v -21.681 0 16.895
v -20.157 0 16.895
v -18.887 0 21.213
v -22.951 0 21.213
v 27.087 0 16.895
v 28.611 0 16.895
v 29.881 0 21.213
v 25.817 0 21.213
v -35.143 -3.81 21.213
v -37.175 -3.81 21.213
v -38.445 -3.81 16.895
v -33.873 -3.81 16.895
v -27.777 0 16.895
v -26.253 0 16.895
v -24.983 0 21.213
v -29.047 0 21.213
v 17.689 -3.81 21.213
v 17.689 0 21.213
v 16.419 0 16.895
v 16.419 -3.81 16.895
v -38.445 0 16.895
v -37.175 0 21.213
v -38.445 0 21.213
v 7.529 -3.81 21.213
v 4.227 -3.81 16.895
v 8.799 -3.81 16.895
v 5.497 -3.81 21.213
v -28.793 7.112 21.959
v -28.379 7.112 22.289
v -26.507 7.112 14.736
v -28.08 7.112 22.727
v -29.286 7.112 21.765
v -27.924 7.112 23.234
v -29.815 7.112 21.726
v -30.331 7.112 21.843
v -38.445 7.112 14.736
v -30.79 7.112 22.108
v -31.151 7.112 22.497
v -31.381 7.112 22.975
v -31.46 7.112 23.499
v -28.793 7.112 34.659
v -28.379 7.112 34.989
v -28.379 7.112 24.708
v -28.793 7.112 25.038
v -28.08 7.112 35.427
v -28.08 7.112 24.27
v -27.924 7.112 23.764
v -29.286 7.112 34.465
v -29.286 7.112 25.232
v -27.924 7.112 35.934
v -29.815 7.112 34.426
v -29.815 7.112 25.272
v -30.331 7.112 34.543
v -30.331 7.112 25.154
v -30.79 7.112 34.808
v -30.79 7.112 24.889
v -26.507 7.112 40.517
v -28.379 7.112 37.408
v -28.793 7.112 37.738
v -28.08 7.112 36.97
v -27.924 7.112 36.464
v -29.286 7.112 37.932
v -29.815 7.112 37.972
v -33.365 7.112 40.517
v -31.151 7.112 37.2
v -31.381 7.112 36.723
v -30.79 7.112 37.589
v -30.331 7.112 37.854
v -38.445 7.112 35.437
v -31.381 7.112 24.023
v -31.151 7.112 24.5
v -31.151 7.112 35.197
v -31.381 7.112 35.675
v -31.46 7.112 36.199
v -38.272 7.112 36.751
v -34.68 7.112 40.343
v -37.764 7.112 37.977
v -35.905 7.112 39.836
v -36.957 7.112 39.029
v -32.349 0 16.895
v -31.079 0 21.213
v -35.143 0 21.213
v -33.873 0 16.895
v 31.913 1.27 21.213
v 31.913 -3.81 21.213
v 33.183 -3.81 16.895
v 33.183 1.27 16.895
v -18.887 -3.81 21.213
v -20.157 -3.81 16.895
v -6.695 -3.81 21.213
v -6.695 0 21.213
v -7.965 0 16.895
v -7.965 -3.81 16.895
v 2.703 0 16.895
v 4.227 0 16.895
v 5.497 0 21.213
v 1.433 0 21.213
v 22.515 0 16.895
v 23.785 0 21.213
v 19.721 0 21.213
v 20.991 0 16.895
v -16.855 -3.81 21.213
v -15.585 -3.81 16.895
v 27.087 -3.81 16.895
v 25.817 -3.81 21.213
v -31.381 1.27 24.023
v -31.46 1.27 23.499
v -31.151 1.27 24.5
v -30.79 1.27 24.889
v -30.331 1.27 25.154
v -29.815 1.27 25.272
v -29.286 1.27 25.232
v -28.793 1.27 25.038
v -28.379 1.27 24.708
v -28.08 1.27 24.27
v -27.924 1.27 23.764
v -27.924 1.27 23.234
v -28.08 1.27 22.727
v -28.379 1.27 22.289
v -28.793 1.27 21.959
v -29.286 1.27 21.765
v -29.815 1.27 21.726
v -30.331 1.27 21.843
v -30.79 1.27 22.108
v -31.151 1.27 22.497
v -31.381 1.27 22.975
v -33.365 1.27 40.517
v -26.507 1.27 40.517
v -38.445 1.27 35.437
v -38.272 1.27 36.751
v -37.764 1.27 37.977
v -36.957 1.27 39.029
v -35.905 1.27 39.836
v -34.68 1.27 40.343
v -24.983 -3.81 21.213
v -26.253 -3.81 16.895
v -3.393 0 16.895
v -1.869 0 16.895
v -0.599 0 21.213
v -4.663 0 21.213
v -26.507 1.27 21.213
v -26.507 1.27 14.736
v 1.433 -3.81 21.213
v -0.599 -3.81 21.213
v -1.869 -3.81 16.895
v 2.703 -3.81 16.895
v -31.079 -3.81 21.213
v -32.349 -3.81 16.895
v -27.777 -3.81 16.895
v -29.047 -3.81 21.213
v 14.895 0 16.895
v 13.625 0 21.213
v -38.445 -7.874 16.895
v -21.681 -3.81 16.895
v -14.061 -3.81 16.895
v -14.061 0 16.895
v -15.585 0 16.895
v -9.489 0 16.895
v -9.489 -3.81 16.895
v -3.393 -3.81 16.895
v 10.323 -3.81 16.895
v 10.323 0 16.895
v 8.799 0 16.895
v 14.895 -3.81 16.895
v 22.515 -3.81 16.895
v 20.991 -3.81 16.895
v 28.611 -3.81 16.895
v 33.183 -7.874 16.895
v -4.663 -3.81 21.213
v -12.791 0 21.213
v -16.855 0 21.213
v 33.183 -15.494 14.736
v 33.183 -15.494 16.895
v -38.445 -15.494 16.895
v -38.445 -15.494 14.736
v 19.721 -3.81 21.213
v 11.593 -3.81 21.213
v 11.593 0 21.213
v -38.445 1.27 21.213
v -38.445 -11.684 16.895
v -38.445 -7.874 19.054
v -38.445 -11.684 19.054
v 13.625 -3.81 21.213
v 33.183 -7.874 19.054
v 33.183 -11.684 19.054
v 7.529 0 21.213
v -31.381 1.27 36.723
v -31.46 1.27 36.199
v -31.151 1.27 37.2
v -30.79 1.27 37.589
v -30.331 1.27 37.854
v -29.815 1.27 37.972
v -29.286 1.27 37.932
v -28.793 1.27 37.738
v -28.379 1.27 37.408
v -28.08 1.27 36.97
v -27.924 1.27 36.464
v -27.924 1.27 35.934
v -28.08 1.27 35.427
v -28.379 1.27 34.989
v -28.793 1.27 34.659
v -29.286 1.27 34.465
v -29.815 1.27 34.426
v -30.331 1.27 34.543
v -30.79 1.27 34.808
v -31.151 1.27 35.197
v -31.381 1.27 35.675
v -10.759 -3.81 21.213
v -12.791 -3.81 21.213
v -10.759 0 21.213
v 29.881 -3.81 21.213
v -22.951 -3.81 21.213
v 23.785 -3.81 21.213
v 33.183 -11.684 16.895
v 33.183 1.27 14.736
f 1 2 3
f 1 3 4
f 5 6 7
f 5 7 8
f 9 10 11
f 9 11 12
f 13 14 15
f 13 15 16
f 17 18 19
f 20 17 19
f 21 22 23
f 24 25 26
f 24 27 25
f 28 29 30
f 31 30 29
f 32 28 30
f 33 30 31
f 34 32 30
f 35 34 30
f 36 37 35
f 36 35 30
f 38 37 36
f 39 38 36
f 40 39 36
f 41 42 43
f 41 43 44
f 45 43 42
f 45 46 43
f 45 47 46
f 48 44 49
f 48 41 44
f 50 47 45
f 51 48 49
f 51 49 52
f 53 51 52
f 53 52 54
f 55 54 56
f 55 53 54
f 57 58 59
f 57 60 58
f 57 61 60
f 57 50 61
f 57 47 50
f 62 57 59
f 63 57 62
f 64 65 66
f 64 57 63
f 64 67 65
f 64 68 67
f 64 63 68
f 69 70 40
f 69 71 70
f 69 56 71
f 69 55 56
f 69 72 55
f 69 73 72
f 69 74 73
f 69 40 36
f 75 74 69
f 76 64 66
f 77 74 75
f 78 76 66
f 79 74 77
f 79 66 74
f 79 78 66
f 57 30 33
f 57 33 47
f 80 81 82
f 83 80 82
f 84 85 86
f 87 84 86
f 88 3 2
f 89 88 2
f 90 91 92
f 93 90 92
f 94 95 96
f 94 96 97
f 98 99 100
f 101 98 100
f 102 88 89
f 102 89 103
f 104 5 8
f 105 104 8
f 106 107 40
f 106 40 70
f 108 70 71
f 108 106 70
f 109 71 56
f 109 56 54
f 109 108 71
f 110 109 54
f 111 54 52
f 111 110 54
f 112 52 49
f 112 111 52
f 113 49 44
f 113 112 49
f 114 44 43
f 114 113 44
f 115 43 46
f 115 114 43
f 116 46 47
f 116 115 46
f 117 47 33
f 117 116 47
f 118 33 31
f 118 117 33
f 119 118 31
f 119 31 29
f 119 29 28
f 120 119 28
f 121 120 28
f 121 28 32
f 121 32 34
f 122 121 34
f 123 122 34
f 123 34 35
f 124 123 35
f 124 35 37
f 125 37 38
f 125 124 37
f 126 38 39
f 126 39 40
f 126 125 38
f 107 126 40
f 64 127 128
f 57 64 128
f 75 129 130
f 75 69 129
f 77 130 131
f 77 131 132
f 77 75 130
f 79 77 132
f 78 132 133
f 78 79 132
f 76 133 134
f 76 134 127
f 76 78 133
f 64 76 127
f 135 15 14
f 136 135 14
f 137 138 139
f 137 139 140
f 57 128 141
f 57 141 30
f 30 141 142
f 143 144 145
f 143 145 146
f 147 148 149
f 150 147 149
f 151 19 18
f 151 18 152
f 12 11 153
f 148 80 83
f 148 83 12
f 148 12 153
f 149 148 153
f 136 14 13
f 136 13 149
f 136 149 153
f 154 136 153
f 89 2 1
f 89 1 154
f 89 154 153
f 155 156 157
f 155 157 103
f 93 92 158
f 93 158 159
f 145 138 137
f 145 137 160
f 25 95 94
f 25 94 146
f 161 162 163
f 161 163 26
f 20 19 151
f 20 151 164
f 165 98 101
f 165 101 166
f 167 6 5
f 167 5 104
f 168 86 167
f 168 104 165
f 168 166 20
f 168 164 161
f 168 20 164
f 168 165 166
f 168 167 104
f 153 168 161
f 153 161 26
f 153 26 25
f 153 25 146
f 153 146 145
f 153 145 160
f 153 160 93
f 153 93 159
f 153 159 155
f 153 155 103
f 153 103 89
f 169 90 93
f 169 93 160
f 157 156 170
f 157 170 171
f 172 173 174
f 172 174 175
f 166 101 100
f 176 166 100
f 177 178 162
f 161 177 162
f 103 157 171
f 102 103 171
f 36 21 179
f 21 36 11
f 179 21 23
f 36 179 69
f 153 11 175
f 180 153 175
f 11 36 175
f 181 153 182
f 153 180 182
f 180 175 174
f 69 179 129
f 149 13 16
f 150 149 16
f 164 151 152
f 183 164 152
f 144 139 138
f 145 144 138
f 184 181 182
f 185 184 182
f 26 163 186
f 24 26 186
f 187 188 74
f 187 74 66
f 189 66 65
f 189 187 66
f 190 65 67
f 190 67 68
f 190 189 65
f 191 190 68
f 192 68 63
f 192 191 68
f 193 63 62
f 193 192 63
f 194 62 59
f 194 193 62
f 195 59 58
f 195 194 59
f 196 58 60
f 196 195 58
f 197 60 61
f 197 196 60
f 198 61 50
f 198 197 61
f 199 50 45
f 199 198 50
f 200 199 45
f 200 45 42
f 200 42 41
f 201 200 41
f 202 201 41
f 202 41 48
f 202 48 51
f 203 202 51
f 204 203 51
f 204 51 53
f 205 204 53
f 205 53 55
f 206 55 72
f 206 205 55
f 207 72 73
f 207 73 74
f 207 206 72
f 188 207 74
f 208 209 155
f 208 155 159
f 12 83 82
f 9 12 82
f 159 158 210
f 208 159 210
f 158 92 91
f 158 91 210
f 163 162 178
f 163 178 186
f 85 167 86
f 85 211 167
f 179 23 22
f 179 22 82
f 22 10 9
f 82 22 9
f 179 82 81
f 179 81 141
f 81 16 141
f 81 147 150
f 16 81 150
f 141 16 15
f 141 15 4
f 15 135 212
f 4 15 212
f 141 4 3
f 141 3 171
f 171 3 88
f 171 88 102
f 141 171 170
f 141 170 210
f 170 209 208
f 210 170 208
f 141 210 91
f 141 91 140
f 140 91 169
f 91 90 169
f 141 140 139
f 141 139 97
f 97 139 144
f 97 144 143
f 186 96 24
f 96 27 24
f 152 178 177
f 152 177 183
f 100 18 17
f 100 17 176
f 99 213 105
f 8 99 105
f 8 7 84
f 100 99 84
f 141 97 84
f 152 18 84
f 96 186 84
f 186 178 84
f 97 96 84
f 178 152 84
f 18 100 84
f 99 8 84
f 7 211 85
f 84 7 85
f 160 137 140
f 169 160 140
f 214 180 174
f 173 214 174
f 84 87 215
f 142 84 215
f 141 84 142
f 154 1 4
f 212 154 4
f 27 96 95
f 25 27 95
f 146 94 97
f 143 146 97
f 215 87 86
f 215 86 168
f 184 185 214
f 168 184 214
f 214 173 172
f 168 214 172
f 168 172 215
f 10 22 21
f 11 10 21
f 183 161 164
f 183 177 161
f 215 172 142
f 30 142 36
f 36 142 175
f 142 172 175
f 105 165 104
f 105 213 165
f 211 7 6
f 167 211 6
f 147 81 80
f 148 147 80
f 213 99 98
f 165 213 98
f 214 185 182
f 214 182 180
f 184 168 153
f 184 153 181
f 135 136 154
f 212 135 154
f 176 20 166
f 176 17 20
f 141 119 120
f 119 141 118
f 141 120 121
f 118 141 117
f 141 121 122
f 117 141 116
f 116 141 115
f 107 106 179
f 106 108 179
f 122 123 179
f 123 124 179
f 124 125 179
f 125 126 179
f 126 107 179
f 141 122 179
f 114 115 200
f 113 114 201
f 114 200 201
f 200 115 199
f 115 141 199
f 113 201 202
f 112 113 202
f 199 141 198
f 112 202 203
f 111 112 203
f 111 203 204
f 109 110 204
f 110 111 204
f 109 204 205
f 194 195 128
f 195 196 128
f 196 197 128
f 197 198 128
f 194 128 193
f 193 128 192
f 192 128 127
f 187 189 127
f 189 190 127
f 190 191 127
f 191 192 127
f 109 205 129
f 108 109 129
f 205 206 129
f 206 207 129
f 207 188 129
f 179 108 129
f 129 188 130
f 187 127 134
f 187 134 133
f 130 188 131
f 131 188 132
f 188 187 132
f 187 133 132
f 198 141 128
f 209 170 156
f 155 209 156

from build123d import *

# Parameters (mm, degrees)
F1_DEPTH = 3.81
F4_DEPTH = 71.628
F6_DEPTH = 1.27
F7_R     = 1.778
F8_DEPTH = 5.842
F9_R     = 5.08


with BuildPart() as f1:
    # F0 (on Front) → F1 (new body)
    with BuildSketch(Plane.XZ):
        Polygon((-38.4448663006, 16.8945933835), (-38.4448663006, 14.7355933835), (33.1831336994, 14.7355933835), (33.1831336994, 16.8945933835), (28.6111336994, 16.8945933835), (27.0871336994, 16.8945933835), (22.5151336994, 16.8945933835), (20.9911336994, 16.8945933835), (16.4191336994, 16.8945933835), (14.8951336994, 16.8945933835), (10.3231336994, 16.8945933835), (8.7991336994, 16.8945933835), (4.2271336994, 16.8945933835), (2.7031336994, 16.8945933835), (-1.8688663006, 16.8945933835), (-3.3928663006, 16.8945933835), (-7.9648663006, 16.8945933835), (-9.4888663006, 16.8945933835), (-14.0608663006, 16.8945933835), (-15.5848663006, 16.8945933835), (-20.1568663006, 16.8945933835), (-21.6808663006, 16.8945933835), (-26.2528663006, 16.8945933835), (-27.7768663006, 16.8945933835), (-32.3488663006, 16.8945933835), (-33.8728663006, 16.8945933835), align=None)
        Polygon((-37.1748663006, 21.2125933835), (-38.4448663006, 16.8945933835), (-33.8728663006, 16.8945933835), (-35.1428663006, 21.2125933835), align=None)
        Polygon((28.6111336994, 16.8945933835), (33.1831336994, 16.8945933835), (31.9131336994, 21.2125933835), (29.8811336994, 21.2125933835), align=None)
        Polygon((-31.0788663006, 21.2125933835), (-32.3488663006, 16.8945933835), (-27.7768663006, 16.8945933835), (-29.0468663006, 21.2125933835), align=None)
        Polygon((22.5151336994, 16.8945933835), (27.0871336994, 16.8945933835), (25.8171336994, 21.2125933835), (23.7851336994, 21.2125933835), align=None)
        Polygon((-24.9828663006, 21.2125933835), (-26.2528663006, 16.8945933835), (-21.6808663006, 16.8945933835), (-22.9508663006, 21.2125933835), align=None)
        Polygon((16.4191336994, 16.8945933835), (20.9911336994, 16.8945933835), (19.7211336994, 21.2125933835), (17.6891336994, 21.2125933835), align=None)
        Polygon((-18.8868663006, 21.2125933835), (-20.1568663006, 16.8945933835), (-15.5848663006, 16.8945933835), (-16.8548663006, 21.2125933835), align=None)
        Polygon((10.3231336994, 16.8945933835), (14.8951336994, 16.8945933835), (13.6251336994, 21.2125933835), (11.5931336994, 21.2125933835), align=None)
        Polygon((-12.7908663006, 21.2125933835), (-14.0608663006, 16.8945933835), (-9.4888663006, 16.8945933835), (-10.7588663006, 21.2125933835), align=None)
        Polygon((4.2271336994, 16.8945933835), (8.7991336994, 16.8945933835), (7.5291336994, 21.2125933835), (5.4971336994, 21.2125933835), align=None)
        Polygon((-6.6948663006, 21.2125933835), (-7.9648663006, 16.8945933835), (-3.3928663006, 16.8945933835), (-4.6628663006, 21.2125933835), align=None)
        Polygon((-1.8688663006, 16.8945933835), (2.7031336994, 16.8945933835), (1.4331336994, 21.2125933835), (-0.5988663006, 21.2125933835), align=None)
    extrude(amount=F1_DEPTH)

    # F3 (on plane+point) → F4 (join, through all)
    with BuildSketch(Plane.YZ.offset(33.1831336994)):
        Polygon((-15.494, 14.7355933835), (-3.81, 14.7355933835), (-3.81, 16.8945933835), (-7.874, 16.8945933835), (-7.874, 19.0535933835), (-11.684, 19.0535933835), (-11.684, 16.8945933835), (-15.494, 16.8945933835), align=None)
    extrude(amount=-F4_DEPTH)

    # F5 (on face) → F6 (join)
    with BuildSketch(Plane(origin=(0, 0, 0), x_dir=(-1, 0, 0), z_dir=(0, 1, 0))):
        Polygon((33.8728663006, 16.8945933835), (35.1428663006, 21.2125933835), (31.0788663006, 21.2125933835), (32.3488663006, 16.8945933835), align=None)
        Polygon((27.7768663006, 16.8945933835), (29.0468663006, 21.2125933835), (24.9828663006, 21.2125933835), (26.2528663006, 16.8945933835), align=None)
        Polygon((21.6808663006, 16.8945933835), (22.9508663006, 21.2125933835), (18.8868663006, 21.2125933835), (20.1568663006, 16.8945933835), align=None)
        Polygon((15.5848663006, 16.8945933835), (16.8548663006, 21.2125933835), (12.7908663006, 21.2125933835), (14.0608663006, 16.8945933835), align=None)
        Polygon((9.4888663006, 16.8945933835), (10.7588663006, 21.2125933835), (6.6948663006, 21.2125933835), (7.9648663006, 16.8945933835), align=None)
        Polygon((3.3928663006, 16.8945933835), (4.6628663006, 21.2125933835), (0.5988663006, 21.2125933835), (1.8688663006, 16.8945933835), align=None)
        Polygon((-1.4331336994, 21.2125933835), (-5.4971336994, 21.2125933835), (-4.2271336994, 16.8945933835), (-2.7031336994, 16.8945933835), align=None)
        Polygon((-7.5291336994, 21.2125933835), (-11.5931336994, 21.2125933835), (-10.3231336994, 16.8945933835), (-8.7991336994, 16.8945933835), align=None)
        Polygon((-13.6251336994, 21.2125933835), (-17.6891336994, 21.2125933835), (-16.4191336994, 16.8945933835), (-14.8951336994, 16.8945933835), align=None)
        Polygon((-19.7211336994, 21.2125933835), (-23.7851336994, 21.2125933835), (-22.5151336994, 16.8945933835), (-20.9911336994, 16.8945933835), align=None)
        Polygon((-25.8171336994, 21.2125933835), (-29.8811336994, 21.2125933835), (-28.6111336994, 16.8945933835), (-27.0871336994, 16.8945933835), align=None)
        Polygon((-33.1831336994, 14.7355933835), (38.4448663006, 14.7355933835), (38.4448663006, 16.8945933835), (37.1748663006, 21.2125933835), (35.1428663006, 21.2125933835), (33.8728663006, 16.8945933835), (32.3488663006, 16.8945933835), (31.0788663006, 21.2125933835), (29.0468663006, 21.2125933835), (27.7768663006, 16.8945933835), (26.2528663006, 16.8945933835), (24.9828663006, 21.2125933835), (22.9508663006, 21.2125933835), (21.6808663006, 16.8945933835), (20.1568663006, 16.8945933835), (18.8868663006, 21.2125933835), (16.8548663006, 21.2125933835), (15.5848663006, 16.8945933835), (14.0608663006, 16.8945933835), (12.7908663006, 21.2125933835), (10.7588663006, 21.2125933835), (9.4888663006, 16.8945933835), (7.9648663006, 16.8945933835), (6.6948663006, 21.2125933835), (4.6628663006, 21.2125933835), (3.3928663006, 16.8945933835), (1.8688663006, 16.8945933835), (0.5988663006, 21.2125933835), (-1.4331336994, 21.2125933835), (-2.7031336994, 16.8945933835), (-4.2271336994, 16.8945933835), (-5.4971336994, 21.2125933835), (-7.5291336994, 21.2125933835), (-8.7991336994, 16.8945933835), (-10.3231336994, 16.8945933835), (-11.5931336994, 21.2125933835), (-13.6251336994, 21.2125933835), (-14.8951336994, 16.8945933835), (-16.4191336994, 16.8945933835), (-17.6891336994, 21.2125933835), (-19.7211336994, 21.2125933835), (-20.9911336994, 16.8945933835), (-22.5151336994, 16.8945933835), (-23.7851336994, 21.2125933835), (-25.8171336994, 21.2125933835), (-27.0871336994, 16.8945933835), (-28.6111336994, 16.8945933835), (-29.8811336994, 21.2125933835), (-31.9131336994, 21.2125933835), (-33.1831336994, 16.8945933835), align=None)
        Polygon((37.1748663006, 21.2125933835), (38.4448663006, 16.8945933835), (38.4448663006, 21.2125933835), align=None)
    extrude(amount=F6_DEPTH)

    # F7 (on face) → F8 (join)
    with BuildSketch(Plane(origin=(0, 1.27, 0), x_dir=(-1, 0, 0), z_dir=(0, 1, 0))):
        Polygon((38.4448663006, 14.7355933835), (38.4448663006, 21.2125933835), (38.4448663006, 40.5165933835), (26.5068663006, 40.5165933835), (26.5068663006, 14.7355933835), align=None)
        with Locations((29.6818663006, 23.4985933835)):
            Circle(F7_R, mode=Mode.SUBTRACT)
        with Locations((29.6818663006, 36.1985933835)):
            Circle(F7_R, mode=Mode.SUBTRACT)
    extrude(amount=F8_DEPTH)

    # F9
    f9_edges = [f1.edges().sort_by_distance(p)[0] for p in [
        (-38.444866, 4.191, 40.516593),
    ]]
    fillet(f9_edges, radius=F9_R)


solid = f1.part
